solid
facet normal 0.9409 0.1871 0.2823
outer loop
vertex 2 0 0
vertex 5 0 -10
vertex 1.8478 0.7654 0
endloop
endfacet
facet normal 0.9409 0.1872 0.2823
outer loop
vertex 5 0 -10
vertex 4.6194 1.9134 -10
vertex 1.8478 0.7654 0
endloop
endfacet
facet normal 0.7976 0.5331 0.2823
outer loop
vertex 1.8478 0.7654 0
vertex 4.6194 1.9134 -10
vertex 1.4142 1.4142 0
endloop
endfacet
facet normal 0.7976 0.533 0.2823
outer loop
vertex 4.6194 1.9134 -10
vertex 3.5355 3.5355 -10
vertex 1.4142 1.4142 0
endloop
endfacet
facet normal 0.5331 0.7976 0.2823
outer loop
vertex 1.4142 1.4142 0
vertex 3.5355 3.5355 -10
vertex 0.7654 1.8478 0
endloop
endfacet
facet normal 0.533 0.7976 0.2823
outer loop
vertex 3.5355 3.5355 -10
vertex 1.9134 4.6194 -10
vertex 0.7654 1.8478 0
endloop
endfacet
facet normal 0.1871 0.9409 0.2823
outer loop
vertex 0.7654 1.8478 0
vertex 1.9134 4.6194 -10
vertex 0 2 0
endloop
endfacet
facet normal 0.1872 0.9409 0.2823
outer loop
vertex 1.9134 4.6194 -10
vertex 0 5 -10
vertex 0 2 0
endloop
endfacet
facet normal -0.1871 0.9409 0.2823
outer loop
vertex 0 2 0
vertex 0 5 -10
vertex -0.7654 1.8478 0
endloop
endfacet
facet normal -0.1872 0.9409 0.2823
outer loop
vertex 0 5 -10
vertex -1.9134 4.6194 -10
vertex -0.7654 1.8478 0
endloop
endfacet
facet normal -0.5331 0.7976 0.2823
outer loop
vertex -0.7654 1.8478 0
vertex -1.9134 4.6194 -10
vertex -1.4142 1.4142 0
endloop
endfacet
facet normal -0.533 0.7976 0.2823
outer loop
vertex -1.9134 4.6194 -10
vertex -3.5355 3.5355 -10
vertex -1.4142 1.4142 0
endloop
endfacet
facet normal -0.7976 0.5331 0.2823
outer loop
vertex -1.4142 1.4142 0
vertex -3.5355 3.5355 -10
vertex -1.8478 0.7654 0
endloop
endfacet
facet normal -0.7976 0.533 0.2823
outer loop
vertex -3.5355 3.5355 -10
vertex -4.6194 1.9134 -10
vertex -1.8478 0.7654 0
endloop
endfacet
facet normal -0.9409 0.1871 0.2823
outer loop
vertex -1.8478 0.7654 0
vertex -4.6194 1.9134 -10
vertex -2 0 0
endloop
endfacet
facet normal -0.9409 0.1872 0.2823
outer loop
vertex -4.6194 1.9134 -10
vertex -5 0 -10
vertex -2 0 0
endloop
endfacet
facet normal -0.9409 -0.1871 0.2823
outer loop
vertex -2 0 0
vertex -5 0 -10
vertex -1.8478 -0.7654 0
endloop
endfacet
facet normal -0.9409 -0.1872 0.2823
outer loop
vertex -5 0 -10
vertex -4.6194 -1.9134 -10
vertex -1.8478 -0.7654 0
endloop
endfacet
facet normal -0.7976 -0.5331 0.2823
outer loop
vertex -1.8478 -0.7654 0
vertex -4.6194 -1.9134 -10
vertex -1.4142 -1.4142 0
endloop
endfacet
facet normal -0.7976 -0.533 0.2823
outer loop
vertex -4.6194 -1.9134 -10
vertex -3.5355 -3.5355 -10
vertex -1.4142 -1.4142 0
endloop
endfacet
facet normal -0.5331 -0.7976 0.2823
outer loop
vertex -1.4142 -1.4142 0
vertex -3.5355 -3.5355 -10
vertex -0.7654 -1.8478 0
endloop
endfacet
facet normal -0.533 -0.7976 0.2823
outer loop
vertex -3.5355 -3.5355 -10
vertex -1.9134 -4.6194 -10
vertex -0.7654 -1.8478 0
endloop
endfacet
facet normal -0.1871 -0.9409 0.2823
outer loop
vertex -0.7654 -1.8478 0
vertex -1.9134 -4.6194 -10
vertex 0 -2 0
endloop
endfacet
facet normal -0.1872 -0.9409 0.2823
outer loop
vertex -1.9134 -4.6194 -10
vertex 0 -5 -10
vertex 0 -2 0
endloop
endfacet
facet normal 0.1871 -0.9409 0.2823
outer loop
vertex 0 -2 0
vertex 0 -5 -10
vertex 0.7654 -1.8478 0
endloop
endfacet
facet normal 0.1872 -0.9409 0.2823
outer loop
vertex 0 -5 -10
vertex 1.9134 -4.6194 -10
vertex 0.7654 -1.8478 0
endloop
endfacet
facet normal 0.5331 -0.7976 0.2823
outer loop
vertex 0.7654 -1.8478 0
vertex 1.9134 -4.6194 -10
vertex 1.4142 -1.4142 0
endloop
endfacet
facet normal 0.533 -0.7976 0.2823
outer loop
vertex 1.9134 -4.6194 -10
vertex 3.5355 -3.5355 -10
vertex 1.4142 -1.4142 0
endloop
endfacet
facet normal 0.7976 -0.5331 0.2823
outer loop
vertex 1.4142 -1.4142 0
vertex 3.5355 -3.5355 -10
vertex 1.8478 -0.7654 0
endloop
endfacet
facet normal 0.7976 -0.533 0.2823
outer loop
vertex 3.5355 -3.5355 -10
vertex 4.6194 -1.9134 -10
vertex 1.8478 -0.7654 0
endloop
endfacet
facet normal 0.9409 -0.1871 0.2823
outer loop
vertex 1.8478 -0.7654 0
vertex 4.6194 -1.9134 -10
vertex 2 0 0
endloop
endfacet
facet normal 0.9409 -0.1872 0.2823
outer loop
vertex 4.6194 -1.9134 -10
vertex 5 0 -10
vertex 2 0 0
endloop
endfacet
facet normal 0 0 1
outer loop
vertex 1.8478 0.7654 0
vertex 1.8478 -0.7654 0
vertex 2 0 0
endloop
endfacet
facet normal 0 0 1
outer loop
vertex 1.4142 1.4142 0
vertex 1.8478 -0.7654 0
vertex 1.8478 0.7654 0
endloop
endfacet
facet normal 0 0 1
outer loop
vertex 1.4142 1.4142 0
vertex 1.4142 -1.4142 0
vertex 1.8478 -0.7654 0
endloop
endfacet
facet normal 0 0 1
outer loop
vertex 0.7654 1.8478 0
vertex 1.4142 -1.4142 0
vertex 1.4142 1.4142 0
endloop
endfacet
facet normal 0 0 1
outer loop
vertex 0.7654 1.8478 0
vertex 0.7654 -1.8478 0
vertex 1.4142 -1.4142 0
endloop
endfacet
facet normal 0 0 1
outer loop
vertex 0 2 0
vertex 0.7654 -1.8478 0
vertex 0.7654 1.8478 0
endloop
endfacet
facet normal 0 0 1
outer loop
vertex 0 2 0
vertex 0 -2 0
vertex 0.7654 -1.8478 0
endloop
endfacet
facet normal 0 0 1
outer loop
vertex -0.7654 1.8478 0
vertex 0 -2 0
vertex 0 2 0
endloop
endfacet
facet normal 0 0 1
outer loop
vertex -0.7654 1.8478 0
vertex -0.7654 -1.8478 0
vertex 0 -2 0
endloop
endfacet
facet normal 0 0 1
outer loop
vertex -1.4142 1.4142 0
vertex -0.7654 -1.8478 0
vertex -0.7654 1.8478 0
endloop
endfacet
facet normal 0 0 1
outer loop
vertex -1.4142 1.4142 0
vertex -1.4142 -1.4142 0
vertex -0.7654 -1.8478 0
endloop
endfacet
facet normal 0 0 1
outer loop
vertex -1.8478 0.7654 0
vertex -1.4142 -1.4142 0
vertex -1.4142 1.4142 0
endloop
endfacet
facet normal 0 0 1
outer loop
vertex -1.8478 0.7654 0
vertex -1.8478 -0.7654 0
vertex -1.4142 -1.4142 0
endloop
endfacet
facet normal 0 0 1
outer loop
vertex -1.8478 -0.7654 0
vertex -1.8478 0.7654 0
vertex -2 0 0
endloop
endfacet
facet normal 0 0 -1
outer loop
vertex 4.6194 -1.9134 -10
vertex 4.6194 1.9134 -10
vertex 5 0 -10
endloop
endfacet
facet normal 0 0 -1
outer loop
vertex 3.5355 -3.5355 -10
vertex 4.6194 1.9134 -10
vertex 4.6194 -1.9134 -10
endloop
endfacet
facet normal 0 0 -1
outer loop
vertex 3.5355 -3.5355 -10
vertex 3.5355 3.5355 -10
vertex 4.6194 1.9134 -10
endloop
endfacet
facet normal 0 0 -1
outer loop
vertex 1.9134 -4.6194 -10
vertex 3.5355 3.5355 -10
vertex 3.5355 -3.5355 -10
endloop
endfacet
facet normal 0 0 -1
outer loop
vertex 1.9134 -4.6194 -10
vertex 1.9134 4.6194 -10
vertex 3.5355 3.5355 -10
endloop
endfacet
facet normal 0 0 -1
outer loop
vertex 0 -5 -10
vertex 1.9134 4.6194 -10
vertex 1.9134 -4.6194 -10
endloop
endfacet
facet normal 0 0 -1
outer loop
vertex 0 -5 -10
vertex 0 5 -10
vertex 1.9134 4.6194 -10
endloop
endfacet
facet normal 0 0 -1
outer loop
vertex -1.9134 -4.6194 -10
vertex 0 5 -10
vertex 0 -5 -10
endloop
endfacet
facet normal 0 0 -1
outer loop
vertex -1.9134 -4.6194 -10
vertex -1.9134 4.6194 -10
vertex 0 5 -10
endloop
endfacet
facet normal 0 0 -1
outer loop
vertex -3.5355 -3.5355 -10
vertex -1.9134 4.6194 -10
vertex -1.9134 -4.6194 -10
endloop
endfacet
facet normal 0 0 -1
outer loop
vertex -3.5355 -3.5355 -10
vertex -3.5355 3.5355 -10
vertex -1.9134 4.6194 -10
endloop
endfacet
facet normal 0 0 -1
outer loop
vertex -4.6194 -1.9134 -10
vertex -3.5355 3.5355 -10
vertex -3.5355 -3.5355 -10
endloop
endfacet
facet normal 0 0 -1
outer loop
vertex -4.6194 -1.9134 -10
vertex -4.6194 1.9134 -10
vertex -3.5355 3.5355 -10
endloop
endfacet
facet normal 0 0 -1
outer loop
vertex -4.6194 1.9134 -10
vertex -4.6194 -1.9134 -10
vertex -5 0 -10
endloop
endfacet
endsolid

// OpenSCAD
mirror([0, 0, 10]) cylinder(h=10, r1=2, r2=5);
%cylinder(h=10, r1=2, r2=5);
